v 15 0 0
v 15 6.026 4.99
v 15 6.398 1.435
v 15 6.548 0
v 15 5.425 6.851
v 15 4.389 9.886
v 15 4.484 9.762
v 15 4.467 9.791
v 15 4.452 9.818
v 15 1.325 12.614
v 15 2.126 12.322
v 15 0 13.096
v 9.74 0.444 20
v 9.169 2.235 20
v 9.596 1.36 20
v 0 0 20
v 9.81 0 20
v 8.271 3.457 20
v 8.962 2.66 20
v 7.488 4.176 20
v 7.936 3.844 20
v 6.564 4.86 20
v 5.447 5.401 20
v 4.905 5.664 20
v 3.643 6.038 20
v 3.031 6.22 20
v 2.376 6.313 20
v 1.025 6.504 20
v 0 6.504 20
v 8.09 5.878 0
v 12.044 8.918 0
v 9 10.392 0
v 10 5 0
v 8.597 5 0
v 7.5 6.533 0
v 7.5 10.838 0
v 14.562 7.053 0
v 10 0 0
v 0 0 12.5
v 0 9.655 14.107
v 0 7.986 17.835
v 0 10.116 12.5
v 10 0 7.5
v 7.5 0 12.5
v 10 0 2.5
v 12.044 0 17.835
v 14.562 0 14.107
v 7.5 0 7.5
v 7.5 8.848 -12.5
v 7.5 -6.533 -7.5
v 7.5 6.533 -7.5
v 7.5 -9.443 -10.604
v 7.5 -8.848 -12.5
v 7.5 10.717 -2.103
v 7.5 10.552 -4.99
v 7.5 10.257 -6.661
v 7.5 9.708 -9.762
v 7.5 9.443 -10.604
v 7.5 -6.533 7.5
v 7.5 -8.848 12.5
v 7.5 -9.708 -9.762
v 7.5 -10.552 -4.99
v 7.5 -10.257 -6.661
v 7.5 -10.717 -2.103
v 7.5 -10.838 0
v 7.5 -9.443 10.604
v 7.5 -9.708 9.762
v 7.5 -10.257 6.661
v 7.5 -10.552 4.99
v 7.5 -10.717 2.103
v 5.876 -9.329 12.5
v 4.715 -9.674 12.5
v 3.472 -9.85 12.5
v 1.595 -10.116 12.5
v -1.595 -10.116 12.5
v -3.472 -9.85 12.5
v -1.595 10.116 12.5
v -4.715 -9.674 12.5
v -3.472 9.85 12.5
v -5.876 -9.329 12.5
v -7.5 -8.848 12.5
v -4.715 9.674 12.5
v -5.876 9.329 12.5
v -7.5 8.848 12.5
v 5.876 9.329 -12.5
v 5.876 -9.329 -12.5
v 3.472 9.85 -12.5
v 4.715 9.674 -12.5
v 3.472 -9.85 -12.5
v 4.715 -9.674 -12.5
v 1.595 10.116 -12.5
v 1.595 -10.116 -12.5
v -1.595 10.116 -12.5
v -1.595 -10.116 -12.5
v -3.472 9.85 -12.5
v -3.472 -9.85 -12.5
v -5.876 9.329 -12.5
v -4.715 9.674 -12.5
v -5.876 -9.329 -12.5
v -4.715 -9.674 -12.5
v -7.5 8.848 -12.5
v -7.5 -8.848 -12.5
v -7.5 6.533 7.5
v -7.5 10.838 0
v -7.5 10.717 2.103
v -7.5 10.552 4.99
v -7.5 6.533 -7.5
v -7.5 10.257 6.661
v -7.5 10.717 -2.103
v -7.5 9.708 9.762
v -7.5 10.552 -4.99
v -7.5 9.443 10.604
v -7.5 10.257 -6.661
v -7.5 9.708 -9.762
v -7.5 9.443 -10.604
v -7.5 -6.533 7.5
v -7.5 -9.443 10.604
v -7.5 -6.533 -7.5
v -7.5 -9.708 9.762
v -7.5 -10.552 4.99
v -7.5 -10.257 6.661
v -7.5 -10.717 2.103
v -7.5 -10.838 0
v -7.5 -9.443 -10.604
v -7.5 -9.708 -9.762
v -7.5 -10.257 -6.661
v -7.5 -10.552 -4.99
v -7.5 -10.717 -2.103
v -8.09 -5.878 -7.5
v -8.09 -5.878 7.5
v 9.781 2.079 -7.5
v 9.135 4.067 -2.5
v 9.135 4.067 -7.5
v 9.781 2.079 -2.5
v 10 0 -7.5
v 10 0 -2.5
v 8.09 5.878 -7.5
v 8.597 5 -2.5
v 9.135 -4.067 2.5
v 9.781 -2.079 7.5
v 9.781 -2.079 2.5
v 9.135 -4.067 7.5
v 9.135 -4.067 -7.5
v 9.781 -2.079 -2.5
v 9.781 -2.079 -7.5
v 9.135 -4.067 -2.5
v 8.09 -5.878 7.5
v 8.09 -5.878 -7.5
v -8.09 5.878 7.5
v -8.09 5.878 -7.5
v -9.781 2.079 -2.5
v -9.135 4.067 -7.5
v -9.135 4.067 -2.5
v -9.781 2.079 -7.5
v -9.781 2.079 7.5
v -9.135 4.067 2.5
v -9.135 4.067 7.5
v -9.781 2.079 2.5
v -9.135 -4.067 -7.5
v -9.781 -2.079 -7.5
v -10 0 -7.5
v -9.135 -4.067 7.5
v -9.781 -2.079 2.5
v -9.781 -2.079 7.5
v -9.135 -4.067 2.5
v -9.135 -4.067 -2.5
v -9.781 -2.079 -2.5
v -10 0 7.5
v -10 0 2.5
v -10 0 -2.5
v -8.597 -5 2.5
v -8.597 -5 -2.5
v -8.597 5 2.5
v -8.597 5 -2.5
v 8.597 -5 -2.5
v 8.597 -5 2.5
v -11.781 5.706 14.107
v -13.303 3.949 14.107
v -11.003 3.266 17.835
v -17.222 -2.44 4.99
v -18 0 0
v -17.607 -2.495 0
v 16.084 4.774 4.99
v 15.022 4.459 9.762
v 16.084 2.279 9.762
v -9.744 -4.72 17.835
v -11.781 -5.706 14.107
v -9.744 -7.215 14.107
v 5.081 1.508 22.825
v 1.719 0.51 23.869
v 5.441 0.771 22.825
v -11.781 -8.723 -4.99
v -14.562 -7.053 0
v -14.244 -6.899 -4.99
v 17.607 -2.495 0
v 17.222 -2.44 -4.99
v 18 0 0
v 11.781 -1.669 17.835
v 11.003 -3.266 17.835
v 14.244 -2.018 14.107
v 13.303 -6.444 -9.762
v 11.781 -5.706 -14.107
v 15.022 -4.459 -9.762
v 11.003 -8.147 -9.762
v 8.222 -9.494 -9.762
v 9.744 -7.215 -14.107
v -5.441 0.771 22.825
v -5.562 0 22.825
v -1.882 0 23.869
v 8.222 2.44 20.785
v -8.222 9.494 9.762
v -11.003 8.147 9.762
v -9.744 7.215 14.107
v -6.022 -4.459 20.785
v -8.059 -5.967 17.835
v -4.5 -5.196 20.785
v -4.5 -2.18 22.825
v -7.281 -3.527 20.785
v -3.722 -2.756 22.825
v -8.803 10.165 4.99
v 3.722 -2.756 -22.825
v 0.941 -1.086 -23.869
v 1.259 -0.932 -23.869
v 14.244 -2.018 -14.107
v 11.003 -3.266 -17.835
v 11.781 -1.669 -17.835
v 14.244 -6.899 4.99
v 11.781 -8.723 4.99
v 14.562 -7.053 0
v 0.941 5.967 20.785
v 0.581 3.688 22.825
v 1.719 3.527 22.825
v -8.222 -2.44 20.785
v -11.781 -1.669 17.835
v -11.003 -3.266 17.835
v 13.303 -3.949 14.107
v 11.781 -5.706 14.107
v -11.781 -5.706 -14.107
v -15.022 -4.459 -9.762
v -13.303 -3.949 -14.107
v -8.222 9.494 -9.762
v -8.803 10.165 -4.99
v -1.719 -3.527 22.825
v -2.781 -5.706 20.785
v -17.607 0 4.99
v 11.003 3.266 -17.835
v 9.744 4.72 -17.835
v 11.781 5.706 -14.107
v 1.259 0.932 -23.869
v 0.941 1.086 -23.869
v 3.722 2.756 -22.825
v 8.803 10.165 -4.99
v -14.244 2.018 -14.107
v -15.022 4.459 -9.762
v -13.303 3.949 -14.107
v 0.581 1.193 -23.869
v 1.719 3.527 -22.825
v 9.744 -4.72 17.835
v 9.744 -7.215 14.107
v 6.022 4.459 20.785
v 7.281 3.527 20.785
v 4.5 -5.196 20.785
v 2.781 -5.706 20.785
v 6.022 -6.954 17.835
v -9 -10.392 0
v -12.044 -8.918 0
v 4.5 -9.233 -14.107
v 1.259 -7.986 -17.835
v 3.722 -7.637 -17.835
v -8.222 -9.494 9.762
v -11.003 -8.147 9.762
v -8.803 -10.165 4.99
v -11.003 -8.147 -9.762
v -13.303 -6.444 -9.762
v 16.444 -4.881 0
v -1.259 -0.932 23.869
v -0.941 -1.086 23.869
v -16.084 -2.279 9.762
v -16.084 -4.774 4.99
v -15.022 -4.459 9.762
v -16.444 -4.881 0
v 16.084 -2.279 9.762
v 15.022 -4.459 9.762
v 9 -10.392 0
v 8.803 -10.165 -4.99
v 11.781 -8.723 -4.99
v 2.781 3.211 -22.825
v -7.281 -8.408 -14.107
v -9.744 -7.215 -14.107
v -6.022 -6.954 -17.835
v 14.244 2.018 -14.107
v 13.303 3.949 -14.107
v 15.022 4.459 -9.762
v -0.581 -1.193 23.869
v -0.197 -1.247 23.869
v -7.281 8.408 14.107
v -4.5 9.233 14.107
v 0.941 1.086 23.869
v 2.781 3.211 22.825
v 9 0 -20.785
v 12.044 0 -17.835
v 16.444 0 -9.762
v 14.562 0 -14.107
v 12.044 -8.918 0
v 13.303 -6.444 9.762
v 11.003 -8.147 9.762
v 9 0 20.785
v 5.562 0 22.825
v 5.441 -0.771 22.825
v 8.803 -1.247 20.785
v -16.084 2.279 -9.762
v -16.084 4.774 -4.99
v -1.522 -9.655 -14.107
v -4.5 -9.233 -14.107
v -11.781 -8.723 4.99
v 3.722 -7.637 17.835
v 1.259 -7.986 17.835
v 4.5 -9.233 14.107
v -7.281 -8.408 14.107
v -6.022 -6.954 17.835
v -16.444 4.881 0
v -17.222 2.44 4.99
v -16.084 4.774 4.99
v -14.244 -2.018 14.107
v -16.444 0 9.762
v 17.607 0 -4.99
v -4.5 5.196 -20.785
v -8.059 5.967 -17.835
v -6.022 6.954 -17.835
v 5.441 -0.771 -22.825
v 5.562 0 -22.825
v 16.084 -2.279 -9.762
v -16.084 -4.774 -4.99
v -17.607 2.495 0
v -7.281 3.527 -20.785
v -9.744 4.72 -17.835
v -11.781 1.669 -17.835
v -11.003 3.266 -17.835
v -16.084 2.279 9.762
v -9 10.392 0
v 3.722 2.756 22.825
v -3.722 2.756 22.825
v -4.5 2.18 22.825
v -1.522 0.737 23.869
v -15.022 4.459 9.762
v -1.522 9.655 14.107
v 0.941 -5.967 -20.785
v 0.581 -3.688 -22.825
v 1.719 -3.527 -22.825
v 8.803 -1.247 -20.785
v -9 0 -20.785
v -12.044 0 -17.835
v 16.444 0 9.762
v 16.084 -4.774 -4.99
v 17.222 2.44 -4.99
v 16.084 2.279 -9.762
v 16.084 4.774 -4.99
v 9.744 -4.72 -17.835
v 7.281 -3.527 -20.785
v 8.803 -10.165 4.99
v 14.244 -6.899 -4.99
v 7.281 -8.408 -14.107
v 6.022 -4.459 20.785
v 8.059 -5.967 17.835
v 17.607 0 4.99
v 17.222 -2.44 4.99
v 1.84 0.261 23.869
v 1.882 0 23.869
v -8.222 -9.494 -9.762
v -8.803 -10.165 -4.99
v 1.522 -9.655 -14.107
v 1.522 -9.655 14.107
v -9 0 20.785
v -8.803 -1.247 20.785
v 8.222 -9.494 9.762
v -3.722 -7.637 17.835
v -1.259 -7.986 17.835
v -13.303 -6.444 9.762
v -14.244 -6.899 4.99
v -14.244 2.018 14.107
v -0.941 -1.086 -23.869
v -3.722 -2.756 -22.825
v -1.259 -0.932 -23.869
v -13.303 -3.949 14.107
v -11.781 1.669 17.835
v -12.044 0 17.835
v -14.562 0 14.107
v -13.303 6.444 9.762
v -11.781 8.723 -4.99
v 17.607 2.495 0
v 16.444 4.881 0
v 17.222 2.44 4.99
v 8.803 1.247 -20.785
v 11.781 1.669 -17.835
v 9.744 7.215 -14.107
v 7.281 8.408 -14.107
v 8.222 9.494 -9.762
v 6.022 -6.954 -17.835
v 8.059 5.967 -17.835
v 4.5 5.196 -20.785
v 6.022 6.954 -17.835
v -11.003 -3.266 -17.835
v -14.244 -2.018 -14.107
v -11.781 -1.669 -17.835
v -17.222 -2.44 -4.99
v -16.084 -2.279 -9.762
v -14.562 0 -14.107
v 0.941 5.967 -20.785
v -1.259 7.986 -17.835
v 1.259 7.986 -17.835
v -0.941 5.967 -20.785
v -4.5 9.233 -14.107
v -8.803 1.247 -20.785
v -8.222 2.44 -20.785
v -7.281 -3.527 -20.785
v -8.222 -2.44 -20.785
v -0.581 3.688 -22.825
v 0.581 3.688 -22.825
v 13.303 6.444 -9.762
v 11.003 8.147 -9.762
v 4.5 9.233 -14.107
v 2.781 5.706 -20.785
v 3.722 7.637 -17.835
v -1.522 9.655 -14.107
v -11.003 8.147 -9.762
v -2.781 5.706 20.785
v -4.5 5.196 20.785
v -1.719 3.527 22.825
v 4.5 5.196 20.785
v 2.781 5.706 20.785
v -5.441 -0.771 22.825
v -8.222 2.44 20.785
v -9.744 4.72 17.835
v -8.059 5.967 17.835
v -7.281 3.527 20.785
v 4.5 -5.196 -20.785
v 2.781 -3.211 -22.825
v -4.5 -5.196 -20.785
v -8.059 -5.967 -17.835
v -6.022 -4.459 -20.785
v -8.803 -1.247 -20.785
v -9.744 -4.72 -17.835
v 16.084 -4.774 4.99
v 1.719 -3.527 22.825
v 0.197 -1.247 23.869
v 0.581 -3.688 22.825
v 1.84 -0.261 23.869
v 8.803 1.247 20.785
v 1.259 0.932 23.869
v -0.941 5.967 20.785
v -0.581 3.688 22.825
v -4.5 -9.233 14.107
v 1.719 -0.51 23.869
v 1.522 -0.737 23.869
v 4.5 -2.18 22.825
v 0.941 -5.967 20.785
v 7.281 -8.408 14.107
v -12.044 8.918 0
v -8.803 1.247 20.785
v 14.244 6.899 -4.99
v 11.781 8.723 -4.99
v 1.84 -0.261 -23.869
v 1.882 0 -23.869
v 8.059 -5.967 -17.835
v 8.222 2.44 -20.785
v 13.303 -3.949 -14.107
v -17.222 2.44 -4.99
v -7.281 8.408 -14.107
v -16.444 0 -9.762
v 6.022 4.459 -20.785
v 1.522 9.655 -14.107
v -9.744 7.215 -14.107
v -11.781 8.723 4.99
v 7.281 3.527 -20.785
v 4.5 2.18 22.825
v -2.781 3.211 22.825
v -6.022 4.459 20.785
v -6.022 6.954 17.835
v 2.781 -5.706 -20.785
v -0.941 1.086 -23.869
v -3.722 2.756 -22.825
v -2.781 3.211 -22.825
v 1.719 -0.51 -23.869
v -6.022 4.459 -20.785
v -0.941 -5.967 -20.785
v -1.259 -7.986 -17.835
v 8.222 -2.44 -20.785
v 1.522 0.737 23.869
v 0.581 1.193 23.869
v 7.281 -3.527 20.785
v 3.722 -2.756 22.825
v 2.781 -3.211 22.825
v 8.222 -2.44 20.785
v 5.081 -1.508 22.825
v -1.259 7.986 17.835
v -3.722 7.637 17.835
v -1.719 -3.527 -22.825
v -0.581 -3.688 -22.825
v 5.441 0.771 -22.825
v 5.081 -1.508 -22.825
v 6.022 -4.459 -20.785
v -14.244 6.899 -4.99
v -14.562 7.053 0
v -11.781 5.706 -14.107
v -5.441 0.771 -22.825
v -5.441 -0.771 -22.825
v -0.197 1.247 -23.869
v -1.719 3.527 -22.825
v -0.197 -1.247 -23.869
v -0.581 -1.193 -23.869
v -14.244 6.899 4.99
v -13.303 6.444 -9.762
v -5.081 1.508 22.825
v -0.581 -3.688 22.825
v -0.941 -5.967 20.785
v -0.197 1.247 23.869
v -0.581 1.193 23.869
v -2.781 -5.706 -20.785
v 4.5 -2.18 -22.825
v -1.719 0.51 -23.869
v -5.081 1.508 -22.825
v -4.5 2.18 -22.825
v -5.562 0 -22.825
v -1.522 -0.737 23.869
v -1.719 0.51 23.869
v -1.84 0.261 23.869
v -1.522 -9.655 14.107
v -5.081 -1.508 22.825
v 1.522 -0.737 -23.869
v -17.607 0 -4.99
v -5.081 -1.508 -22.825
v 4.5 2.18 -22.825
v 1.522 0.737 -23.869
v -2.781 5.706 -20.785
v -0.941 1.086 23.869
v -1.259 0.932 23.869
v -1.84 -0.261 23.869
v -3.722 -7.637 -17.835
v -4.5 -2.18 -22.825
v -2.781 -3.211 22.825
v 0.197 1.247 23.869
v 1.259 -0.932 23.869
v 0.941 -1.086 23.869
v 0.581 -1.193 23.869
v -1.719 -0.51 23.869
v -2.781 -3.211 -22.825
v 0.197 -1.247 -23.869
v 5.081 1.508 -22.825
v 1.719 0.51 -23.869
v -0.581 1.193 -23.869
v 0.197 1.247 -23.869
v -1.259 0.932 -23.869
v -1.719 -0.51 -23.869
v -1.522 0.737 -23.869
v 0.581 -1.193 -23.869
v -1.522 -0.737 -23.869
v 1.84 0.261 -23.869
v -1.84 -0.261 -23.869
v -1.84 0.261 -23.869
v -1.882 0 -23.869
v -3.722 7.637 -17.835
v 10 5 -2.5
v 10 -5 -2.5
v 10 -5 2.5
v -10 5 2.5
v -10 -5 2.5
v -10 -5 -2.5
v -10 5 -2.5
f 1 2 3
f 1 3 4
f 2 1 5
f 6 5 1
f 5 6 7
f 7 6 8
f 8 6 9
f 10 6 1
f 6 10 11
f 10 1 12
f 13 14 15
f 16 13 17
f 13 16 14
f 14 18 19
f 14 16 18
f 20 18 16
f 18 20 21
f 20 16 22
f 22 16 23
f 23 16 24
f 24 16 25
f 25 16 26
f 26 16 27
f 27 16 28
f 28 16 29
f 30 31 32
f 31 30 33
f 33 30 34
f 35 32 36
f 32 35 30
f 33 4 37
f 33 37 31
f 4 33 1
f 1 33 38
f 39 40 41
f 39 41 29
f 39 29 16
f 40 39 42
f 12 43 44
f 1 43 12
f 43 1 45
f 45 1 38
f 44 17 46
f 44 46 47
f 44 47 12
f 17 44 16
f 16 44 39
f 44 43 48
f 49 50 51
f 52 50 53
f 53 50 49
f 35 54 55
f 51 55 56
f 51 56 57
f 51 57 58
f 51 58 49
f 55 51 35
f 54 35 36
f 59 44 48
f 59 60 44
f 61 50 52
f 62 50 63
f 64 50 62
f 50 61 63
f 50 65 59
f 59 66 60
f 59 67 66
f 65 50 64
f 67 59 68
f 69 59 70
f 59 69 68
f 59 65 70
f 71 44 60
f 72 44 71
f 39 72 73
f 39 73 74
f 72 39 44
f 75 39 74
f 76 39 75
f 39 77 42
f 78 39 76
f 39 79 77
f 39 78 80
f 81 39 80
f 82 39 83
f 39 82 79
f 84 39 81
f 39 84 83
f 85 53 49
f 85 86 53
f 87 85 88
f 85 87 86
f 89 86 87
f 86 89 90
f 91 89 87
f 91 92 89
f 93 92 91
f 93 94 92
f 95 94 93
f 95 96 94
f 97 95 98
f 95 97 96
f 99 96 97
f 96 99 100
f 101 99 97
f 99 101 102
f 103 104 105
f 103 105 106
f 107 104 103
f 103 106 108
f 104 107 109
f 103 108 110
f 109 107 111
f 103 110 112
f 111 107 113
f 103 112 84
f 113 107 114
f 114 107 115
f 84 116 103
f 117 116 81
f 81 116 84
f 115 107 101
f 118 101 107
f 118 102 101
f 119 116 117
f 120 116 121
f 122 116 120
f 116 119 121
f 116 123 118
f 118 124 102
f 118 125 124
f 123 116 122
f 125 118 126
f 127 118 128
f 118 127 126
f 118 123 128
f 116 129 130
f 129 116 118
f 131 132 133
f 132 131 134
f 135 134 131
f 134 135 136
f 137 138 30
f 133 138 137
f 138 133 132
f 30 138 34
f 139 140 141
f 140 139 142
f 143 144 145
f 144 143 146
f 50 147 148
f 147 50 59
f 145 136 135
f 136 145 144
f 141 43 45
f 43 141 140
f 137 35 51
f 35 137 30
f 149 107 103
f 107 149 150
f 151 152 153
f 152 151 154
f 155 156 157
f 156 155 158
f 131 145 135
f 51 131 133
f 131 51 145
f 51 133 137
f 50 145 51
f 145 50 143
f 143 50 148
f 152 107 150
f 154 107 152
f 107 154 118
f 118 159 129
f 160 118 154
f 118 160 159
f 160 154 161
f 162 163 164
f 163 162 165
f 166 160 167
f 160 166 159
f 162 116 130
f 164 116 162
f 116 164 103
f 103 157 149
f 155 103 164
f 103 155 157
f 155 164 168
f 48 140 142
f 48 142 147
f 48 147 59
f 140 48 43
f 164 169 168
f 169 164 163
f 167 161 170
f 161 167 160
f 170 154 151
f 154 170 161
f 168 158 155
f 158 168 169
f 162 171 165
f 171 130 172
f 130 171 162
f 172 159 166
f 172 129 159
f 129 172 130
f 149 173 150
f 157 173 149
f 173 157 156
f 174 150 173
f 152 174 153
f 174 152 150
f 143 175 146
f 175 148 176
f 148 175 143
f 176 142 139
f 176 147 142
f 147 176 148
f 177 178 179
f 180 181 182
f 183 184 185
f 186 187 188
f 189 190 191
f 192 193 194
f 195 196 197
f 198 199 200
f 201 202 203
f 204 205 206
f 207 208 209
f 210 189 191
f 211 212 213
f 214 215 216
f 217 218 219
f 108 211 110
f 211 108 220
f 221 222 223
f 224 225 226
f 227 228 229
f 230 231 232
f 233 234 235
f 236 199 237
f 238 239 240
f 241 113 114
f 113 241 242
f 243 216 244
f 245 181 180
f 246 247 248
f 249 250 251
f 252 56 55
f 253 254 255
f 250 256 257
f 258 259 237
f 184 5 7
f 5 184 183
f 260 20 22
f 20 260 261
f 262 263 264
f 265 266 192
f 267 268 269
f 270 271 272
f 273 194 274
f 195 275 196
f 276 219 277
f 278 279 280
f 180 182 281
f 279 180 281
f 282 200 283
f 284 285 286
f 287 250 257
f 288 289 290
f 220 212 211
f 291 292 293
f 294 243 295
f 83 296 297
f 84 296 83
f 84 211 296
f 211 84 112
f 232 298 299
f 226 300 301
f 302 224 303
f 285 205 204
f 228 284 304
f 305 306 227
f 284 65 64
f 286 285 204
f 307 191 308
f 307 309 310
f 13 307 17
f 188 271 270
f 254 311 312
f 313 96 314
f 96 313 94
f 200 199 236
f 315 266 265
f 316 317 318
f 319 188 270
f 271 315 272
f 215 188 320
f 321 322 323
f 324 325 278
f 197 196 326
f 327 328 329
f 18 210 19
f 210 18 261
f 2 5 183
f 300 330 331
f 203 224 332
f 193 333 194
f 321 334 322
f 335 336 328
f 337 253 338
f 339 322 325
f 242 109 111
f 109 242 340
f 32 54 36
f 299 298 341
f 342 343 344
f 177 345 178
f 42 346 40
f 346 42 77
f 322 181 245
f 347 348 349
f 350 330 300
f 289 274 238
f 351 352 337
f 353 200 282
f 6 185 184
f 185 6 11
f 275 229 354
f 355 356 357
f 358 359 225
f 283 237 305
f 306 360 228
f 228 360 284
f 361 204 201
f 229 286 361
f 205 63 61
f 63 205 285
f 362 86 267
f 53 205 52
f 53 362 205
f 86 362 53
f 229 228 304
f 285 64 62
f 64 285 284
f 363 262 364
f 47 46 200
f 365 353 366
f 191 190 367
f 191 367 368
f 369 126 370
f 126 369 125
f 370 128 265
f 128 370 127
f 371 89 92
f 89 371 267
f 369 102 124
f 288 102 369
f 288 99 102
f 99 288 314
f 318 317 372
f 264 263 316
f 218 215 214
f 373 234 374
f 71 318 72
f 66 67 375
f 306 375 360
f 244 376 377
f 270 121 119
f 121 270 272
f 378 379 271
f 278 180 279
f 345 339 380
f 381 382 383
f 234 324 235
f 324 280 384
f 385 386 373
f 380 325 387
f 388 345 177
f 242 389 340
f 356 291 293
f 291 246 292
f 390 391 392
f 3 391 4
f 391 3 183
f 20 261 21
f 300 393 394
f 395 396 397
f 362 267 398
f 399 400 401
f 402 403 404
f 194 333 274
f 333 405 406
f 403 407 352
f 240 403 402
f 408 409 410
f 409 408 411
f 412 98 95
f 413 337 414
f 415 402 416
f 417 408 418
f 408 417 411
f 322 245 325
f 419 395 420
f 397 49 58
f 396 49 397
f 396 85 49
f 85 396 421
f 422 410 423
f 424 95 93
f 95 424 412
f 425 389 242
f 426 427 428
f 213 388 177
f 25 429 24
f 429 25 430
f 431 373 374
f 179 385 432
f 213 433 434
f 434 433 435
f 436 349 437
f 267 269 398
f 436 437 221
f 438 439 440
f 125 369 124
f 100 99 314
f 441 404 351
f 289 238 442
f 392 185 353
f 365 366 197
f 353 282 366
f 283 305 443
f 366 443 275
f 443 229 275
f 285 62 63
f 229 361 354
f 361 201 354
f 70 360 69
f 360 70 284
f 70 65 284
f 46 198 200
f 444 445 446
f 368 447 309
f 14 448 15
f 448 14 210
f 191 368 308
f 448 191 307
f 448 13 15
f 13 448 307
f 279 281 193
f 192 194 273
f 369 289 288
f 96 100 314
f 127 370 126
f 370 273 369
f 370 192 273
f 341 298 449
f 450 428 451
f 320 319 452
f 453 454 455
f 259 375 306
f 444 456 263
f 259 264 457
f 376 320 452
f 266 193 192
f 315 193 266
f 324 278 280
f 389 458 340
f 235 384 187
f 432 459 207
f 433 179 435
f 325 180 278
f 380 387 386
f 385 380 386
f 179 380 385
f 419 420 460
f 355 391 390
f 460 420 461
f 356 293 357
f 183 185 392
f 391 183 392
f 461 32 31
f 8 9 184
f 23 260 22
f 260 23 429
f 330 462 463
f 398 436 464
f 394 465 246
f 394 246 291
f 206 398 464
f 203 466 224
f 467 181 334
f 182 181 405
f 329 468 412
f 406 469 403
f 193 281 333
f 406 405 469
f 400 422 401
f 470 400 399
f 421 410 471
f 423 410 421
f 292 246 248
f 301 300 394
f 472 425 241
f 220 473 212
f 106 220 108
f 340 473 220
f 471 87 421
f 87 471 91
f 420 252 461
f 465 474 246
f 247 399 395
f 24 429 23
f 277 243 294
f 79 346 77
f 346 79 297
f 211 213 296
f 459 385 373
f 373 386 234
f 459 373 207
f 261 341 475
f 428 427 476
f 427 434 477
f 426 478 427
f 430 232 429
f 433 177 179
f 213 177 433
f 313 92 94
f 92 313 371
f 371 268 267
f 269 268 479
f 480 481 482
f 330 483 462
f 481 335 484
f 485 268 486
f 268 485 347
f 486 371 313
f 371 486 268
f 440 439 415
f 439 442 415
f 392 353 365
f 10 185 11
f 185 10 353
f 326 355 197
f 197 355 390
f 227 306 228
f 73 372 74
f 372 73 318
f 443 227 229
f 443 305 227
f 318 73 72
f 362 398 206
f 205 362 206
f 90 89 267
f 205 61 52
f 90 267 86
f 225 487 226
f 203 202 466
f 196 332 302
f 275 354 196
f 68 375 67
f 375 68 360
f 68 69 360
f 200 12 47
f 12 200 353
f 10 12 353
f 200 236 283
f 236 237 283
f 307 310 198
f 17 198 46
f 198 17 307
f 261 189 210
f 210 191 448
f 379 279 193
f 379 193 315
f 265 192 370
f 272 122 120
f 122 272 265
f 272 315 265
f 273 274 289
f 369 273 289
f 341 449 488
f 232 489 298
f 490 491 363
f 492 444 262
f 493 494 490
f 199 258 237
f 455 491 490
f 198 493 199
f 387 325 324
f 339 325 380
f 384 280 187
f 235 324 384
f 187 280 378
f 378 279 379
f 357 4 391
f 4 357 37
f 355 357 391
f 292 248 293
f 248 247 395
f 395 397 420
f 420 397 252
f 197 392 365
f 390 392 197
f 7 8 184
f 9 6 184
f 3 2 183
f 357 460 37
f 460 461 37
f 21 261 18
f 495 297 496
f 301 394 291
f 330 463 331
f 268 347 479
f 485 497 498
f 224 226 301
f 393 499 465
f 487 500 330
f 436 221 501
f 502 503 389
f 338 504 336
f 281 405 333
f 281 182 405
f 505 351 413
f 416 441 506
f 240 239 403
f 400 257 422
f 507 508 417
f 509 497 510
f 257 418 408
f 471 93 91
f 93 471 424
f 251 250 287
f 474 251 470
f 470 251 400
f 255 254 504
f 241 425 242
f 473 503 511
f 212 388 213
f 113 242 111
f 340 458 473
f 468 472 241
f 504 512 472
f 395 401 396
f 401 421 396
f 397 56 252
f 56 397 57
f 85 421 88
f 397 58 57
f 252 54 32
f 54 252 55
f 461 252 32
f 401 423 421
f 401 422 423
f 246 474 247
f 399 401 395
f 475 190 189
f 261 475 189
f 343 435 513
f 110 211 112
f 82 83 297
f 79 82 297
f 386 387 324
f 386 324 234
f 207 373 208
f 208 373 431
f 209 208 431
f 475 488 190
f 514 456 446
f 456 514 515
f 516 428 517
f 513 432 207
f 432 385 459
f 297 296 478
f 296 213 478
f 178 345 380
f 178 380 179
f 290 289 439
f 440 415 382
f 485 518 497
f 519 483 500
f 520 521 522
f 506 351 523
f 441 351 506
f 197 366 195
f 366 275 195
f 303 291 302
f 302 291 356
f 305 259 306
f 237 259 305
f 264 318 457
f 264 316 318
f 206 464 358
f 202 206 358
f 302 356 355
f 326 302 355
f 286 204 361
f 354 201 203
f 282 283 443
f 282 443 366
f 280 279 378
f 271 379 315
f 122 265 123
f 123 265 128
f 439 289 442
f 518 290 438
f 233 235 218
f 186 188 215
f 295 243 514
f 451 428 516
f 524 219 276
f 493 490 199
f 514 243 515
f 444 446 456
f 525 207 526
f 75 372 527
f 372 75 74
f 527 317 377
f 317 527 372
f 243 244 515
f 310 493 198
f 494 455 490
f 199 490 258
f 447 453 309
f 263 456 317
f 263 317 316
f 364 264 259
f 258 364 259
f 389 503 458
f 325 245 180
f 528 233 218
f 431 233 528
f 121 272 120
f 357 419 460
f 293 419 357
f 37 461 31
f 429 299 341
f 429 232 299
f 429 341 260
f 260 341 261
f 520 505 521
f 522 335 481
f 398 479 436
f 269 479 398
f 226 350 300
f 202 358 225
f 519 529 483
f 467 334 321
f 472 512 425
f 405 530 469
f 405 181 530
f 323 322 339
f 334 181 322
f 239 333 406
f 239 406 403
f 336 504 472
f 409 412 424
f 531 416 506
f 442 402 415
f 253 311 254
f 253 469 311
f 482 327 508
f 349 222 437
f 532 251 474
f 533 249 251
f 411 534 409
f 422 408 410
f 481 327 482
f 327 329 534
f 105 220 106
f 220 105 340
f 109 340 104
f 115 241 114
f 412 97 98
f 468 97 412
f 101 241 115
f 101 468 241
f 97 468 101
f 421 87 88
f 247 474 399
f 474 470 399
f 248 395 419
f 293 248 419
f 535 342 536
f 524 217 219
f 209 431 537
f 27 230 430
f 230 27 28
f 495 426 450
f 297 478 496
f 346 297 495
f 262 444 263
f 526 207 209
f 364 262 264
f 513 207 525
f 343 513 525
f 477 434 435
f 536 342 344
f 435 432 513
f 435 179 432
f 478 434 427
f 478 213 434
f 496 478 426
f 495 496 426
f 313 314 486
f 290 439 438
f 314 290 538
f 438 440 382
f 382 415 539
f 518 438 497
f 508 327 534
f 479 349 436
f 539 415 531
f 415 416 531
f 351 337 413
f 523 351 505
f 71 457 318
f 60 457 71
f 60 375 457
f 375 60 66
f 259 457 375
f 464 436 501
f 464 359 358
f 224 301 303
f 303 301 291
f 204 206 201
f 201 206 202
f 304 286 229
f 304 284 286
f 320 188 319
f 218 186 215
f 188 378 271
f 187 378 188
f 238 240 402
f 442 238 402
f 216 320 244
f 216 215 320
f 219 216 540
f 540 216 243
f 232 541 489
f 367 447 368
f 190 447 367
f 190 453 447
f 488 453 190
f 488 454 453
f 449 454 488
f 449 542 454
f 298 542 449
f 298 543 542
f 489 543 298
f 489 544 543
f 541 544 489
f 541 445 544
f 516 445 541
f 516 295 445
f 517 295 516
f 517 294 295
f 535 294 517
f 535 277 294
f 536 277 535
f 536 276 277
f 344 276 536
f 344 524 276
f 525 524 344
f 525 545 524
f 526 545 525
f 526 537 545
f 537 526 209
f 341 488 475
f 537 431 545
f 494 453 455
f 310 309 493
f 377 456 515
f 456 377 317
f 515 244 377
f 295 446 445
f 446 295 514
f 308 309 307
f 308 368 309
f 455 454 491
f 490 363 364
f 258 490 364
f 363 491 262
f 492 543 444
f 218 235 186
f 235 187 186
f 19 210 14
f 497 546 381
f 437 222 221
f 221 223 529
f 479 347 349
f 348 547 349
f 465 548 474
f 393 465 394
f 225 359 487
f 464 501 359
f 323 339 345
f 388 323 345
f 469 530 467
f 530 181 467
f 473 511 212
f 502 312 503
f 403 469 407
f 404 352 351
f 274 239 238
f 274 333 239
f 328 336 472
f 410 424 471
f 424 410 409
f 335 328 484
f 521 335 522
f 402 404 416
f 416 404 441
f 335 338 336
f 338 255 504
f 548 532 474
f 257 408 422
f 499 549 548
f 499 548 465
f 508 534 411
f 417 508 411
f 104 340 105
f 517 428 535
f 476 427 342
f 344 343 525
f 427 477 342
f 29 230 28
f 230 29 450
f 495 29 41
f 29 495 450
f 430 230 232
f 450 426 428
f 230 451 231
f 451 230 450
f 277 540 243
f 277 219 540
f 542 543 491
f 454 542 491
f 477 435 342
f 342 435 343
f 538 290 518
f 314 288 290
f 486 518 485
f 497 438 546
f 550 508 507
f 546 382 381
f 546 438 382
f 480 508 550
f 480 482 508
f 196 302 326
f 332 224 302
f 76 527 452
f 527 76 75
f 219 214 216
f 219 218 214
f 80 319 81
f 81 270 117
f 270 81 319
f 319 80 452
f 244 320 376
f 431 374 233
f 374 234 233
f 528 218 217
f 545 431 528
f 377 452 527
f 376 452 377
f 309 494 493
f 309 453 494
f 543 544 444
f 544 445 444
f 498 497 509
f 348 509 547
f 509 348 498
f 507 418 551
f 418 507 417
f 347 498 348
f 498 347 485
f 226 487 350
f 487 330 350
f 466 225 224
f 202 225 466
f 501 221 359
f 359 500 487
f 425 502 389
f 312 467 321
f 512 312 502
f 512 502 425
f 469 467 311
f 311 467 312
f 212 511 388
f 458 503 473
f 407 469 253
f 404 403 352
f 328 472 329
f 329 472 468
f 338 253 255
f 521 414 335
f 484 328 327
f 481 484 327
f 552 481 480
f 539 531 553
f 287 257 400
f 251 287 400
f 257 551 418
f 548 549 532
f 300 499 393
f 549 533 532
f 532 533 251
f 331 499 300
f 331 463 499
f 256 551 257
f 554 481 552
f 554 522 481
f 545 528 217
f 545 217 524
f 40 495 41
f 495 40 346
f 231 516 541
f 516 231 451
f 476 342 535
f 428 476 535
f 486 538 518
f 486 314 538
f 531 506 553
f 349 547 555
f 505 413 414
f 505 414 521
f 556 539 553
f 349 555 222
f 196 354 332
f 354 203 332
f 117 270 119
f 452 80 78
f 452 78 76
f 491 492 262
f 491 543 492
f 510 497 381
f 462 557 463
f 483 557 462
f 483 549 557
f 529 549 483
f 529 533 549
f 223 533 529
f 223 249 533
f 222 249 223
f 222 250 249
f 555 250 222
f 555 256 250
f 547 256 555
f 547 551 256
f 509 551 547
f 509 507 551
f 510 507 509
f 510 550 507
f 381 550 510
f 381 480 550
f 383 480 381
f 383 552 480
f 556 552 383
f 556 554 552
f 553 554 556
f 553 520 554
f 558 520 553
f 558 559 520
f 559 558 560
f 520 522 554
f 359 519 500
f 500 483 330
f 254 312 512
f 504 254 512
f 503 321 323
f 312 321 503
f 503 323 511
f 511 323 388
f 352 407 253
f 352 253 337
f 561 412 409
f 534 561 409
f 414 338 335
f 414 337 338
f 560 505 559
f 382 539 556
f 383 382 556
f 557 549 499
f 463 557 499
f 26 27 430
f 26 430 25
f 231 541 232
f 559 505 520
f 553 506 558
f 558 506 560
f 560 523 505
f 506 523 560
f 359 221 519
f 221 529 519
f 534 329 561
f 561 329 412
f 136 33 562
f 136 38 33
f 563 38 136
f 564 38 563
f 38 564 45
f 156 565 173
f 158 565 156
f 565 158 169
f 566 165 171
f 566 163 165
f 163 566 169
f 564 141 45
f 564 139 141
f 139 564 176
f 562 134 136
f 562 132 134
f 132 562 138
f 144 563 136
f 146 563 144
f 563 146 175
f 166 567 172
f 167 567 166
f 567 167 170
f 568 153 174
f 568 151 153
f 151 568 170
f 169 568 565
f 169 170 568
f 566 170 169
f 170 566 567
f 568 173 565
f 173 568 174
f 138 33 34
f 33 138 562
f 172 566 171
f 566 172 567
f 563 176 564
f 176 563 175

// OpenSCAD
// Generated by generate_scads.py
difference() {
  scale([1.5,1.0,2.0]) {
    sphere(r=12);
  }
  cube(size=[20,10,5], center=true);
  scale([1.5,1.0,1.5]) {
    cylinder(h=15, r=2, center=true);
  }
  union() {
    cube(size=[15,15,20], center=false);
    cube(size=[15,30,25], center=true);
    cylinder(h=15, r=10, center=true);
    cube(size=[5,30,25], center=true);
  }
}
